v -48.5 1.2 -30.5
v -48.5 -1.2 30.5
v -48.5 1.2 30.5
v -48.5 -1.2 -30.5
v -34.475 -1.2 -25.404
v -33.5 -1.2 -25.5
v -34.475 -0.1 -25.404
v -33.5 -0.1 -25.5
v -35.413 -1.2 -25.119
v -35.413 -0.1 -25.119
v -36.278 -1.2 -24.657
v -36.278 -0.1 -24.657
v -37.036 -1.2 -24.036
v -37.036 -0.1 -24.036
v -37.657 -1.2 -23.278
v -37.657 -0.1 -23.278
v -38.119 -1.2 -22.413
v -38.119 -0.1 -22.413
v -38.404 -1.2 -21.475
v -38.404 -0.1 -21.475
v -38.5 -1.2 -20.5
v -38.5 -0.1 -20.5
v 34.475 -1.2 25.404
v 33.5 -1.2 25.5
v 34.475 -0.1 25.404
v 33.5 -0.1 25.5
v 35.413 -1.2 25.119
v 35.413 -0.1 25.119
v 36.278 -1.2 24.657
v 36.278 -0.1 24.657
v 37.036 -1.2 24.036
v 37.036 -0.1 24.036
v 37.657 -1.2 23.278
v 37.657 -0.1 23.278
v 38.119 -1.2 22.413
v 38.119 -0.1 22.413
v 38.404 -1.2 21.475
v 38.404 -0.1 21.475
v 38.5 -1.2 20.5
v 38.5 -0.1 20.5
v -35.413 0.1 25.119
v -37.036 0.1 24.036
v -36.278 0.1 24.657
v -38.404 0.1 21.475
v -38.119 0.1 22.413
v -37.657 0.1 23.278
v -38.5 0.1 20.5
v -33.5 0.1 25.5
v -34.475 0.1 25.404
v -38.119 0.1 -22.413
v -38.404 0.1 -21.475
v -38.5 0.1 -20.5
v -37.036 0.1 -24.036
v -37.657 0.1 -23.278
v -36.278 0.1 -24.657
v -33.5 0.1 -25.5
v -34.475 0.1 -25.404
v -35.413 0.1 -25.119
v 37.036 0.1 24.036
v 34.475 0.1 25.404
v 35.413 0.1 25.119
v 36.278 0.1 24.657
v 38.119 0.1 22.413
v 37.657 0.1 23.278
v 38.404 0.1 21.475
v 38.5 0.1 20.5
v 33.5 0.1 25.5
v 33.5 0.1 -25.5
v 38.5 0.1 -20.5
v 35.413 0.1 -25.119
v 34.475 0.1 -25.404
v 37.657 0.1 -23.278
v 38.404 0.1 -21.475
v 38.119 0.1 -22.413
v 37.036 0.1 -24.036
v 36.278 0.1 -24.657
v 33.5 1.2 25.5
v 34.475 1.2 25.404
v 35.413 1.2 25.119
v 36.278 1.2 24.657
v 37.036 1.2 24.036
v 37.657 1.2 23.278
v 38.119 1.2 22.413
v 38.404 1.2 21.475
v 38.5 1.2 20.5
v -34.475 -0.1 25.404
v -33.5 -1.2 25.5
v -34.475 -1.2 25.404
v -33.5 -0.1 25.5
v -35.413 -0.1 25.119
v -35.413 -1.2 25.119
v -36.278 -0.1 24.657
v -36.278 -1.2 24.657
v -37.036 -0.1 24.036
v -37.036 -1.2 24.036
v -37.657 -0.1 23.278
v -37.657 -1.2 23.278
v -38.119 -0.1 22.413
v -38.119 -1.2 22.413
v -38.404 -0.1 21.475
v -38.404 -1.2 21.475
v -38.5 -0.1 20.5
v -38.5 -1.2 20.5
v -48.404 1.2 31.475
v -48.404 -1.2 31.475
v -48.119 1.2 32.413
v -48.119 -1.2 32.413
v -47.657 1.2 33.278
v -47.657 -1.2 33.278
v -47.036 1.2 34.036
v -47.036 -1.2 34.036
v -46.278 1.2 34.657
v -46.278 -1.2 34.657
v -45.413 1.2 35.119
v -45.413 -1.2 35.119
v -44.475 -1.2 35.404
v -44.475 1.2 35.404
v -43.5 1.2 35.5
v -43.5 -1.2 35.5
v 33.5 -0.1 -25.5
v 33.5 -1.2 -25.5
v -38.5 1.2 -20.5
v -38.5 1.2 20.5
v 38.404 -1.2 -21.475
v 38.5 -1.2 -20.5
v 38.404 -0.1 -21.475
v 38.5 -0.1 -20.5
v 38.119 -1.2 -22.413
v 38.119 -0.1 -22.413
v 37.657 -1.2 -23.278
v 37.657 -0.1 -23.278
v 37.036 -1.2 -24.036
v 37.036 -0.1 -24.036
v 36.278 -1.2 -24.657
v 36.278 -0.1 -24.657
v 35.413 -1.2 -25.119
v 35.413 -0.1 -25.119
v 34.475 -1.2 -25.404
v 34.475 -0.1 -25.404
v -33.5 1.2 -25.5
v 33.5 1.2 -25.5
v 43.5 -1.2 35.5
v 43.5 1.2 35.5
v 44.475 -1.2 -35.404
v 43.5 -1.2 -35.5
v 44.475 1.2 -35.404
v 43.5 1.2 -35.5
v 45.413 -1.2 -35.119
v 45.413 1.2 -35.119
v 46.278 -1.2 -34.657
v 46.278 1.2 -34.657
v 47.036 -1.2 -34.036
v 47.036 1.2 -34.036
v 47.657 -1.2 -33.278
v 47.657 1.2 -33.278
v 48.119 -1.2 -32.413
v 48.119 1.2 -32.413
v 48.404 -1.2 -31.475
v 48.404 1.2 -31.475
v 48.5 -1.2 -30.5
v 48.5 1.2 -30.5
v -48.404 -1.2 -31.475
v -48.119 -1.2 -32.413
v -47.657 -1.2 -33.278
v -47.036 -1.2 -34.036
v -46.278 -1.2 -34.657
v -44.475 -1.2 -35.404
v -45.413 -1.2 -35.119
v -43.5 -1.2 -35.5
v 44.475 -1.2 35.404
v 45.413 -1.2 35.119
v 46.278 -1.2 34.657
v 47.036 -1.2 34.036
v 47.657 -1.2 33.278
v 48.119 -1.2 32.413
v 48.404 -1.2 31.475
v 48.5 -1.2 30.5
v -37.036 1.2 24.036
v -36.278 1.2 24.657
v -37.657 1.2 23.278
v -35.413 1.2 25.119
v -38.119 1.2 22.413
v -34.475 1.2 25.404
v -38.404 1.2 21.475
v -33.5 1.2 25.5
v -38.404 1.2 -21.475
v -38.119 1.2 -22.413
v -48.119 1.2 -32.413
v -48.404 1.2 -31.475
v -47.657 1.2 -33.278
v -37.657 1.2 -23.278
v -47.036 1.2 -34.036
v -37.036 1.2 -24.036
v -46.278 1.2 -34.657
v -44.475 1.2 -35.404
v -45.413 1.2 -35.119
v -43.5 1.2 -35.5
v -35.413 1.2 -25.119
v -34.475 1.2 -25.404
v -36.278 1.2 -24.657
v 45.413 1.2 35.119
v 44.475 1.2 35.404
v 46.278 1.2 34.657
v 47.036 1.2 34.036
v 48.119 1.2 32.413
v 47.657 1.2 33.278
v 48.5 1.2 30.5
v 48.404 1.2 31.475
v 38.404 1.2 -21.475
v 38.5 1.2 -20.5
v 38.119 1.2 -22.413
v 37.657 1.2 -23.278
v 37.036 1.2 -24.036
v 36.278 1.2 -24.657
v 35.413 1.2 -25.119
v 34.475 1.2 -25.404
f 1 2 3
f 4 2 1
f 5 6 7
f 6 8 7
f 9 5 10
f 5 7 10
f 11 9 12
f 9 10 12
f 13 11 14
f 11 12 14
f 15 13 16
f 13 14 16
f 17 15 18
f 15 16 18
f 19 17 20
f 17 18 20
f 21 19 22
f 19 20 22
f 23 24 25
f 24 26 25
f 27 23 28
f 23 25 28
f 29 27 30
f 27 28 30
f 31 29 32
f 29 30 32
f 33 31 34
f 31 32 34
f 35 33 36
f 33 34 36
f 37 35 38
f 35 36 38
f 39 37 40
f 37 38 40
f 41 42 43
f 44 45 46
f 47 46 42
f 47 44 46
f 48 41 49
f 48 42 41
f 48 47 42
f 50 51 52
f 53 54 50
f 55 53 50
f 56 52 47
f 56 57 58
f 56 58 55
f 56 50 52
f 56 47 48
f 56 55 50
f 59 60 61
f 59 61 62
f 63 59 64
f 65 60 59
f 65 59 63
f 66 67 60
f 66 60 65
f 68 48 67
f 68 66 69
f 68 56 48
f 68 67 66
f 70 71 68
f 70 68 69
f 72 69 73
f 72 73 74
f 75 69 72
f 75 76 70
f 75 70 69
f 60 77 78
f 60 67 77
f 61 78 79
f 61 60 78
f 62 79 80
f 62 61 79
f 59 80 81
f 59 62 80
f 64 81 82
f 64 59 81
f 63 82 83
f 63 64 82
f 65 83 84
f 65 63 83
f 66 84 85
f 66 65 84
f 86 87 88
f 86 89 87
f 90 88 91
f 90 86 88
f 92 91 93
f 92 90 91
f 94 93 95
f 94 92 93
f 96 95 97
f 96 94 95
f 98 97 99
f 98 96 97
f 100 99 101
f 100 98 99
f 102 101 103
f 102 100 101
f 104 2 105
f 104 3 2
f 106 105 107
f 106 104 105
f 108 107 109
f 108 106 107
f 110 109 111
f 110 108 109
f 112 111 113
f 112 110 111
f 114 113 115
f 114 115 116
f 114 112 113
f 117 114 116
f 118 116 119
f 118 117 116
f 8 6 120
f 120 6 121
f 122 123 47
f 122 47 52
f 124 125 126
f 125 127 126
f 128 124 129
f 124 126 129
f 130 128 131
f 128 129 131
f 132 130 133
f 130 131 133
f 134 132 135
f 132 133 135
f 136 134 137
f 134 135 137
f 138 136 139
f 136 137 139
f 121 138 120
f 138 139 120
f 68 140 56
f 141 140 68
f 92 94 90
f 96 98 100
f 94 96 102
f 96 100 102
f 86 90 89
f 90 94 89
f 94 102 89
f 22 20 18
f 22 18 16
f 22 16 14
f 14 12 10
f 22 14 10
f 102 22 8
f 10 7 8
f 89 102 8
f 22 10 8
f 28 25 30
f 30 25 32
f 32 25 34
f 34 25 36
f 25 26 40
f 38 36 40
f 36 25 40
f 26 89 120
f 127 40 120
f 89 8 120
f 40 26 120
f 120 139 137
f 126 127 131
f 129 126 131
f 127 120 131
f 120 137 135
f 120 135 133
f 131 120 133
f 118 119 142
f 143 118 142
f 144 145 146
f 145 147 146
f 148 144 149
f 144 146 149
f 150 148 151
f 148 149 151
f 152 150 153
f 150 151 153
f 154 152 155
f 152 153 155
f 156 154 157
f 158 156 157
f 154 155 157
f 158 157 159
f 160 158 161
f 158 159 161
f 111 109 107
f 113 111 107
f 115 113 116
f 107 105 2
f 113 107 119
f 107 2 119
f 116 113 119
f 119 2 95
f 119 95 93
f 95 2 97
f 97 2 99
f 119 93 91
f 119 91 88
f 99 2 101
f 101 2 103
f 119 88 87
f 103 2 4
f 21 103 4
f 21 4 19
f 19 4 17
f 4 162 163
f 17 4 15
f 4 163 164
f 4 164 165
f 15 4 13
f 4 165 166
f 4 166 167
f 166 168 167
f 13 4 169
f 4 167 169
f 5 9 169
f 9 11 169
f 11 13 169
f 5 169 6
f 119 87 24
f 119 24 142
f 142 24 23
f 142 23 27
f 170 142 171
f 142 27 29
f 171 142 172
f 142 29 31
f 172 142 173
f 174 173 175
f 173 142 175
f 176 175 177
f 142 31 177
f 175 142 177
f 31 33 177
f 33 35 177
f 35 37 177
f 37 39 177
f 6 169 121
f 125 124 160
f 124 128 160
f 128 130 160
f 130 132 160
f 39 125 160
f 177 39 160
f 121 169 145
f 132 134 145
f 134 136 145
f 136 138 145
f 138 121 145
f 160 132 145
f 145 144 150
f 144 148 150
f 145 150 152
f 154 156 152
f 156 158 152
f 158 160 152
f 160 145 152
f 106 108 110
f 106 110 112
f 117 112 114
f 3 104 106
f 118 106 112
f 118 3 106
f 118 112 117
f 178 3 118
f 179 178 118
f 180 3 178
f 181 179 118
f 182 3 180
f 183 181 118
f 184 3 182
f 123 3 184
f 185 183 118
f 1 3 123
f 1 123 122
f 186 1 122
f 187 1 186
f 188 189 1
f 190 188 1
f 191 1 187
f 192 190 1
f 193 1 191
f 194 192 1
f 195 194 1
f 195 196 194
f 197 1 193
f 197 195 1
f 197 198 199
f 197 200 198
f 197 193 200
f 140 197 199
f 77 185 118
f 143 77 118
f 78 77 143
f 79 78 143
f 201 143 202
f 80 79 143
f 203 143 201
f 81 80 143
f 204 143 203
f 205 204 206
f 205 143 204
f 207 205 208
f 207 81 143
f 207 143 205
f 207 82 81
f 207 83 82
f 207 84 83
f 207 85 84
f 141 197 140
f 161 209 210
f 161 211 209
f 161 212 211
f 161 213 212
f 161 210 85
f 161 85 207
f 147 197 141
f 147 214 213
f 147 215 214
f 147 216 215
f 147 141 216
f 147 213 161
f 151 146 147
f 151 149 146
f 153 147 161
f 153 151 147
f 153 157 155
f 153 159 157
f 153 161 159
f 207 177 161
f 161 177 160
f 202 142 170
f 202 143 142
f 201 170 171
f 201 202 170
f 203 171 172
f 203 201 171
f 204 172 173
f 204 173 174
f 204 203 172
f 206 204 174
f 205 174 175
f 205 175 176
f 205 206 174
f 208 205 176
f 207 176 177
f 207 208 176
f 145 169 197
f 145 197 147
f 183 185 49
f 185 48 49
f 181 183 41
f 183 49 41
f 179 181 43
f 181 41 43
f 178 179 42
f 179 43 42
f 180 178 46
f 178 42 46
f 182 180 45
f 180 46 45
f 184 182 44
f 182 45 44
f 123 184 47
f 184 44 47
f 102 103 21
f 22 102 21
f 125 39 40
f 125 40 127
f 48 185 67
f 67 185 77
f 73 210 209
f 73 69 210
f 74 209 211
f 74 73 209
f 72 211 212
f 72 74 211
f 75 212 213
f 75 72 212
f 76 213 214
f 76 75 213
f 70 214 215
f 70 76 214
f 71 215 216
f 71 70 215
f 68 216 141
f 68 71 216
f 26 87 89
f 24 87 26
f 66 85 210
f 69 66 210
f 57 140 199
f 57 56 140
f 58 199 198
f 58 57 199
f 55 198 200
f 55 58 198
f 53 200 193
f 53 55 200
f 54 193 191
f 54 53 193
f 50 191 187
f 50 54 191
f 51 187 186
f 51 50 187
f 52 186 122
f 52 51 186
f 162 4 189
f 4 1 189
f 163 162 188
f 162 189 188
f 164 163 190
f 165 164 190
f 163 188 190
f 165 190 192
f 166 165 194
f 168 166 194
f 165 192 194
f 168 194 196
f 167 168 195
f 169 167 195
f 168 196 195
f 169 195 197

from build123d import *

# Parameters (mm, degrees)
BOSS_EXTRUDE1_DEPTH      = 1.2
BOSS_EXTRUDE1_DEPTH_BACK = 1.2
SKETCH1_W                = 97
SKETCH1_H                = 71
SKETCH2_W                = 77
SKETCH2_H                = 51
CUT_EXTRUDE1_DEPTH       = 1.1
FILLET1_R                = 5
FILLET1_OF_MIRROR3_R     = 5
FILLET2_R                = 5


with BuildPart() as part:
    # Sketch1 → Boss-Extrude1 (new, two sides: drawn at the far end of the back side and taken through both)
    with BuildSketch(Plane(origin=(0, 0, 0), x_dir=(1, 0, 0), z_dir=(0, 1, 0)).offset(-BOSS_EXTRUDE1_DEPTH_BACK)):
        Rectangle(SKETCH1_W, SKETCH1_H)
    extrude(amount=BOSS_EXTRUDE1_DEPTH + BOSS_EXTRUDE1_DEPTH_BACK)

    # Sketch2 → Cut-Extrude1 (cut)
    with BuildSketch(Plane(origin=(0, 1.2, 0), x_dir=(1, 0, 0), z_dir=(0, 1, 0))):
        Rectangle(SKETCH2_W, SKETCH2_H)
    cut_extrude1 = extrude(amount=-CUT_EXTRUDE1_DEPTH, mode=Mode.SUBTRACT)

    # Fillet1
    fillet1_edges = [part.edges().sort_by_distance(p)[0] for p in [
        (38.5, 0.65, 25.5),
        (-38.5, 0.65, 25.5),
        (-38.5, 0.65, -25.5),
        (38.5, 0.65, -25.5),
    ]]
    fillet(fillet1_edges, radius=FILLET1_R)

    # Mirror3: Cut-Extrude1 across plane
    add(cut_extrude1.mirror(Plane.ZX), mode=Mode.SUBTRACT)

    # Fillet1 of Mirror3
    fillet1_of_mirror3_edges = [part.edges().sort_by_distance(p)[0] for p in [
        (38.5, -0.65, 25.5),
        (-38.5, -0.65, 25.5),
        (-38.5, -0.65, -25.5),
        (38.5, -0.65, -25.5),
    ]]
    fillet(fillet1_of_mirror3_edges, radius=FILLET1_OF_MIRROR3_R)

    # Fillet2
    fillet2_edges = [part.edges().sort_by_distance(p)[0] for p in [
        (48.5, 0, 35.5),
        (-48.5, 0, 35.5),
        (-48.5, 0, -35.5),
        (48.5, 0, -35.5),
    ]]
    fillet(fillet2_edges, radius=FILLET2_R)


solid = part.part
